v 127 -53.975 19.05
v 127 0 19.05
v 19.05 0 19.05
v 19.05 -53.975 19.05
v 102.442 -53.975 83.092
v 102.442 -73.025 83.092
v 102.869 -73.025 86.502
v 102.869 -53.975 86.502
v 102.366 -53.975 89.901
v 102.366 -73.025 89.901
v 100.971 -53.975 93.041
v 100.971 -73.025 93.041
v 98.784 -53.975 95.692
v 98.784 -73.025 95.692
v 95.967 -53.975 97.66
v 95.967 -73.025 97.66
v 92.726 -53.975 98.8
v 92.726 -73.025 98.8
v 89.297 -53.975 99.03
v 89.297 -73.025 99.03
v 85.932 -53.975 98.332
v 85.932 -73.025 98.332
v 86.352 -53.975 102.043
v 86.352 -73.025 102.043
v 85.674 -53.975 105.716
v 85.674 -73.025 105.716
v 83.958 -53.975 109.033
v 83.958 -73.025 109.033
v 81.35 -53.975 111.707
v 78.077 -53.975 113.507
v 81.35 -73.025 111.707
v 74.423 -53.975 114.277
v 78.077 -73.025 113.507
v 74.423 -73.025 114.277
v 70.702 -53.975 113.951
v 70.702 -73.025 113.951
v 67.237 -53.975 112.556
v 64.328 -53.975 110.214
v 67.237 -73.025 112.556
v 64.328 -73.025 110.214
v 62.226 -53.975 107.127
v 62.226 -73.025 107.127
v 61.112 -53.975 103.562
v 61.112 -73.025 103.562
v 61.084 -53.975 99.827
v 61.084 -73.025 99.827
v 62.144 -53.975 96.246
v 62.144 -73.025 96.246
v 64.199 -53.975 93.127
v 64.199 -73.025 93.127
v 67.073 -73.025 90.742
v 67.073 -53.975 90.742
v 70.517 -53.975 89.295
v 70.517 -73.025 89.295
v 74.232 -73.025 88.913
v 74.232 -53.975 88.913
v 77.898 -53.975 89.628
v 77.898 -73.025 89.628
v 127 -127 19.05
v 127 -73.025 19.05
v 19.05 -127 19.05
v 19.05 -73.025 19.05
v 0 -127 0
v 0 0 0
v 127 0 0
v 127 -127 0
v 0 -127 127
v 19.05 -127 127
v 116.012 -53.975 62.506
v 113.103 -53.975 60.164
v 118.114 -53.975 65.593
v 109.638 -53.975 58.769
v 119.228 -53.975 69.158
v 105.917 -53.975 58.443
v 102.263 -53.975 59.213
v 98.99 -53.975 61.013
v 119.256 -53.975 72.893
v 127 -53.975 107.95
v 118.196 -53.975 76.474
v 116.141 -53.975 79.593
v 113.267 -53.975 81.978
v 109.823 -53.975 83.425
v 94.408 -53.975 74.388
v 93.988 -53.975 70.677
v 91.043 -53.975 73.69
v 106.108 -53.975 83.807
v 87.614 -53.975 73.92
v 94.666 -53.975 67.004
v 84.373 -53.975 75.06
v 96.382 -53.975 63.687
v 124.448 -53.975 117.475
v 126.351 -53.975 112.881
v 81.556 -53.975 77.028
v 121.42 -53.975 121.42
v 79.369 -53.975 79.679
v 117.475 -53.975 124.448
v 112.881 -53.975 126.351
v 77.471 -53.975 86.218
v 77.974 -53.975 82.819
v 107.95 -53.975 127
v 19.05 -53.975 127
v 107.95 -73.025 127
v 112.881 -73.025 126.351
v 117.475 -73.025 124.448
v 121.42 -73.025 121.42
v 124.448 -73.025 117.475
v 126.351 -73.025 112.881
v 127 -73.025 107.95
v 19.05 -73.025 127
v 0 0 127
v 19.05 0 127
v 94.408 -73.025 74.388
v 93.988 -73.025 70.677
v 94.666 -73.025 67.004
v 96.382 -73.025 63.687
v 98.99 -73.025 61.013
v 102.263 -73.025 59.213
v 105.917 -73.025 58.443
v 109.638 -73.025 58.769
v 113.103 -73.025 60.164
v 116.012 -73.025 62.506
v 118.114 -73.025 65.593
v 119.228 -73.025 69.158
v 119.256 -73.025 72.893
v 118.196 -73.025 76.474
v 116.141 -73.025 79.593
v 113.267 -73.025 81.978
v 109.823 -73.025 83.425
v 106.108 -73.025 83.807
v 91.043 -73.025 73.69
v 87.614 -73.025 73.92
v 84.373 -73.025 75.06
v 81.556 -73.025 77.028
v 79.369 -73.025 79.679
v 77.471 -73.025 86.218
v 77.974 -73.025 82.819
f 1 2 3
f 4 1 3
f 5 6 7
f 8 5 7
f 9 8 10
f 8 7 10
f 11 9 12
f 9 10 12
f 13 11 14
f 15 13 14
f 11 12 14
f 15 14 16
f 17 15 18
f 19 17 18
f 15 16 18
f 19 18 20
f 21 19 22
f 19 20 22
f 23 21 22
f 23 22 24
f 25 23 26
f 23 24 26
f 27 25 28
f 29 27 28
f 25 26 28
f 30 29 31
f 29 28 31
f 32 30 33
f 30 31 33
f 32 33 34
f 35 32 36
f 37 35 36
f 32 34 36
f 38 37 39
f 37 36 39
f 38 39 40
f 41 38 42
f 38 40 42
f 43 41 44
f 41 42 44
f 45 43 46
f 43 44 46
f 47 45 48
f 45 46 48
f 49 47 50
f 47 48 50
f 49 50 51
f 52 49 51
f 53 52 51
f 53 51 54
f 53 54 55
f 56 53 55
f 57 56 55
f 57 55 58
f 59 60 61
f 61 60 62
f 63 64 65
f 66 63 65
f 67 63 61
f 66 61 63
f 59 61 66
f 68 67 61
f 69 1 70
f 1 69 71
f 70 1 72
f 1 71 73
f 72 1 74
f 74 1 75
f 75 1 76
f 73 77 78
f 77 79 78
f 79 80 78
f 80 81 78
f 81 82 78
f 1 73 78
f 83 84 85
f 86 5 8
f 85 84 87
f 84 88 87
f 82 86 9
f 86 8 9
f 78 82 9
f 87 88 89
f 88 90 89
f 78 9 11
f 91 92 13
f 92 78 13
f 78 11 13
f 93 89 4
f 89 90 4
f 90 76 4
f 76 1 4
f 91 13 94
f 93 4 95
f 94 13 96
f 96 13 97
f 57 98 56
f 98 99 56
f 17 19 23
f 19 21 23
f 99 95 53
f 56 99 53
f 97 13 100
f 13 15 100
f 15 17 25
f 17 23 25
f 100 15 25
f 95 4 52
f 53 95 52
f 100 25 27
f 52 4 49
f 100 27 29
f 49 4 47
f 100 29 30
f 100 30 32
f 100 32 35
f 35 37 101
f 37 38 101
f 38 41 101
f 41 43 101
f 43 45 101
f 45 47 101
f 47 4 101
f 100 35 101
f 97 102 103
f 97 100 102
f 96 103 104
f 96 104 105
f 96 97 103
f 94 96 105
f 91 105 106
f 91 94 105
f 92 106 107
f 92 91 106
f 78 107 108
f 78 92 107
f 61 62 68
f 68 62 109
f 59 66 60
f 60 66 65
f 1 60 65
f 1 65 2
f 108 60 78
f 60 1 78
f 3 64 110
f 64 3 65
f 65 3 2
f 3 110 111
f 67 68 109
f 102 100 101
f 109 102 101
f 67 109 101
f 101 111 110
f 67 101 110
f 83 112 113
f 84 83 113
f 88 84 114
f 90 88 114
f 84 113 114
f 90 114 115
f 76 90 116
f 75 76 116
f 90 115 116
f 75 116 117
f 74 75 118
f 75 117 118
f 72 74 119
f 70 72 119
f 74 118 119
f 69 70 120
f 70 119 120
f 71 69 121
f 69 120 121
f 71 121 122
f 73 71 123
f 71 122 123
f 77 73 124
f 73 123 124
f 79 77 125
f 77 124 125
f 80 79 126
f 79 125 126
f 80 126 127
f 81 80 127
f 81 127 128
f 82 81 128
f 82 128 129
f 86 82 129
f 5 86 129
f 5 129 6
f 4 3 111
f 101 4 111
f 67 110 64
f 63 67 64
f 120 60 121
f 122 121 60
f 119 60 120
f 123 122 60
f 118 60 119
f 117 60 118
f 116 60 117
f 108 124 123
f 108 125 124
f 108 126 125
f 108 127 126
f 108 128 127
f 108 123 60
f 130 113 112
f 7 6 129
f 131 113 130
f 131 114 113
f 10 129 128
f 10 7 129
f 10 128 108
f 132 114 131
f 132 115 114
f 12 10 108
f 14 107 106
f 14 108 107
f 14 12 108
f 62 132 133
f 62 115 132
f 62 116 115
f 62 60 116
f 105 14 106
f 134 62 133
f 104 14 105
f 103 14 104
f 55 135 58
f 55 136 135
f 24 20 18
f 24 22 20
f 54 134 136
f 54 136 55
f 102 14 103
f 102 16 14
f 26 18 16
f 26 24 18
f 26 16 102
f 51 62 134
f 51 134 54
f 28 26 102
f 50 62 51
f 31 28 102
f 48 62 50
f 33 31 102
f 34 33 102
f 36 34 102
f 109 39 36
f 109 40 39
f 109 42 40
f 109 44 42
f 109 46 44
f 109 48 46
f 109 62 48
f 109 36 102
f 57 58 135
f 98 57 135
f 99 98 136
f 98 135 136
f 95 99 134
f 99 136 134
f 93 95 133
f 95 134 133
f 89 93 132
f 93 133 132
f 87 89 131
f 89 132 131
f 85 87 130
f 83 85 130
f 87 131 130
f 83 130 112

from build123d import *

# Parameters (mm, degrees)
F1_DEPTH = 127
F2_W     = 19.05
F2_H     = 107.95
F3_DEPTH = 107.95
F4_R     = 19.05
F6_DEPTH = 25.4


with BuildPart() as f1:
    # F0 (on Front) → F1 (new body)
    with BuildSketch(Plane.XZ):
        Polygon((0, 127), (0, 0), (127, 0), (127, 19.05), (19.05, 19.05), (19.05, 127), align=None)
    extrude(amount=F1_DEPTH)

    # F2 (on face) → F3 (join, through all)
    with BuildSketch(Plane.YZ.offset(19.05)):
        with Locations((-63.5, 73.025)):
            Rectangle(F2_W, F2_H)
    extrude(amount=F3_DEPTH)

    # F4
    f4_edges = [f1.edges().sort_by_distance(p)[0] for p in [
        (127, -63.5, 127),
    ]]
    fillet(f4_edges, radius=F4_R)

    # F5 (on face) → F6 (cut)
    with BuildSketch(Plane.XZ.offset(73.025)):
        with BuildLine():
            ThreePointArc((77.897624, 89.627843), (81.555843, 77.027996), (94.407624, 74.387843))
            ThreePointArc((94.407624, 74.387843), (116.012004, 62.505843), (102.442376, 83.092157))
            ThreePointArc((102.442376, 83.092157), (98.784157, 95.692004), (85.932376, 98.332157))
            ThreePointArc((85.932376, 98.332157), (64.327996, 110.214157), (77.897624, 89.627843))
        make_face()
    extrude(amount=-F6_DEPTH, mode=Mode.SUBTRACT)


solid = f1.part
